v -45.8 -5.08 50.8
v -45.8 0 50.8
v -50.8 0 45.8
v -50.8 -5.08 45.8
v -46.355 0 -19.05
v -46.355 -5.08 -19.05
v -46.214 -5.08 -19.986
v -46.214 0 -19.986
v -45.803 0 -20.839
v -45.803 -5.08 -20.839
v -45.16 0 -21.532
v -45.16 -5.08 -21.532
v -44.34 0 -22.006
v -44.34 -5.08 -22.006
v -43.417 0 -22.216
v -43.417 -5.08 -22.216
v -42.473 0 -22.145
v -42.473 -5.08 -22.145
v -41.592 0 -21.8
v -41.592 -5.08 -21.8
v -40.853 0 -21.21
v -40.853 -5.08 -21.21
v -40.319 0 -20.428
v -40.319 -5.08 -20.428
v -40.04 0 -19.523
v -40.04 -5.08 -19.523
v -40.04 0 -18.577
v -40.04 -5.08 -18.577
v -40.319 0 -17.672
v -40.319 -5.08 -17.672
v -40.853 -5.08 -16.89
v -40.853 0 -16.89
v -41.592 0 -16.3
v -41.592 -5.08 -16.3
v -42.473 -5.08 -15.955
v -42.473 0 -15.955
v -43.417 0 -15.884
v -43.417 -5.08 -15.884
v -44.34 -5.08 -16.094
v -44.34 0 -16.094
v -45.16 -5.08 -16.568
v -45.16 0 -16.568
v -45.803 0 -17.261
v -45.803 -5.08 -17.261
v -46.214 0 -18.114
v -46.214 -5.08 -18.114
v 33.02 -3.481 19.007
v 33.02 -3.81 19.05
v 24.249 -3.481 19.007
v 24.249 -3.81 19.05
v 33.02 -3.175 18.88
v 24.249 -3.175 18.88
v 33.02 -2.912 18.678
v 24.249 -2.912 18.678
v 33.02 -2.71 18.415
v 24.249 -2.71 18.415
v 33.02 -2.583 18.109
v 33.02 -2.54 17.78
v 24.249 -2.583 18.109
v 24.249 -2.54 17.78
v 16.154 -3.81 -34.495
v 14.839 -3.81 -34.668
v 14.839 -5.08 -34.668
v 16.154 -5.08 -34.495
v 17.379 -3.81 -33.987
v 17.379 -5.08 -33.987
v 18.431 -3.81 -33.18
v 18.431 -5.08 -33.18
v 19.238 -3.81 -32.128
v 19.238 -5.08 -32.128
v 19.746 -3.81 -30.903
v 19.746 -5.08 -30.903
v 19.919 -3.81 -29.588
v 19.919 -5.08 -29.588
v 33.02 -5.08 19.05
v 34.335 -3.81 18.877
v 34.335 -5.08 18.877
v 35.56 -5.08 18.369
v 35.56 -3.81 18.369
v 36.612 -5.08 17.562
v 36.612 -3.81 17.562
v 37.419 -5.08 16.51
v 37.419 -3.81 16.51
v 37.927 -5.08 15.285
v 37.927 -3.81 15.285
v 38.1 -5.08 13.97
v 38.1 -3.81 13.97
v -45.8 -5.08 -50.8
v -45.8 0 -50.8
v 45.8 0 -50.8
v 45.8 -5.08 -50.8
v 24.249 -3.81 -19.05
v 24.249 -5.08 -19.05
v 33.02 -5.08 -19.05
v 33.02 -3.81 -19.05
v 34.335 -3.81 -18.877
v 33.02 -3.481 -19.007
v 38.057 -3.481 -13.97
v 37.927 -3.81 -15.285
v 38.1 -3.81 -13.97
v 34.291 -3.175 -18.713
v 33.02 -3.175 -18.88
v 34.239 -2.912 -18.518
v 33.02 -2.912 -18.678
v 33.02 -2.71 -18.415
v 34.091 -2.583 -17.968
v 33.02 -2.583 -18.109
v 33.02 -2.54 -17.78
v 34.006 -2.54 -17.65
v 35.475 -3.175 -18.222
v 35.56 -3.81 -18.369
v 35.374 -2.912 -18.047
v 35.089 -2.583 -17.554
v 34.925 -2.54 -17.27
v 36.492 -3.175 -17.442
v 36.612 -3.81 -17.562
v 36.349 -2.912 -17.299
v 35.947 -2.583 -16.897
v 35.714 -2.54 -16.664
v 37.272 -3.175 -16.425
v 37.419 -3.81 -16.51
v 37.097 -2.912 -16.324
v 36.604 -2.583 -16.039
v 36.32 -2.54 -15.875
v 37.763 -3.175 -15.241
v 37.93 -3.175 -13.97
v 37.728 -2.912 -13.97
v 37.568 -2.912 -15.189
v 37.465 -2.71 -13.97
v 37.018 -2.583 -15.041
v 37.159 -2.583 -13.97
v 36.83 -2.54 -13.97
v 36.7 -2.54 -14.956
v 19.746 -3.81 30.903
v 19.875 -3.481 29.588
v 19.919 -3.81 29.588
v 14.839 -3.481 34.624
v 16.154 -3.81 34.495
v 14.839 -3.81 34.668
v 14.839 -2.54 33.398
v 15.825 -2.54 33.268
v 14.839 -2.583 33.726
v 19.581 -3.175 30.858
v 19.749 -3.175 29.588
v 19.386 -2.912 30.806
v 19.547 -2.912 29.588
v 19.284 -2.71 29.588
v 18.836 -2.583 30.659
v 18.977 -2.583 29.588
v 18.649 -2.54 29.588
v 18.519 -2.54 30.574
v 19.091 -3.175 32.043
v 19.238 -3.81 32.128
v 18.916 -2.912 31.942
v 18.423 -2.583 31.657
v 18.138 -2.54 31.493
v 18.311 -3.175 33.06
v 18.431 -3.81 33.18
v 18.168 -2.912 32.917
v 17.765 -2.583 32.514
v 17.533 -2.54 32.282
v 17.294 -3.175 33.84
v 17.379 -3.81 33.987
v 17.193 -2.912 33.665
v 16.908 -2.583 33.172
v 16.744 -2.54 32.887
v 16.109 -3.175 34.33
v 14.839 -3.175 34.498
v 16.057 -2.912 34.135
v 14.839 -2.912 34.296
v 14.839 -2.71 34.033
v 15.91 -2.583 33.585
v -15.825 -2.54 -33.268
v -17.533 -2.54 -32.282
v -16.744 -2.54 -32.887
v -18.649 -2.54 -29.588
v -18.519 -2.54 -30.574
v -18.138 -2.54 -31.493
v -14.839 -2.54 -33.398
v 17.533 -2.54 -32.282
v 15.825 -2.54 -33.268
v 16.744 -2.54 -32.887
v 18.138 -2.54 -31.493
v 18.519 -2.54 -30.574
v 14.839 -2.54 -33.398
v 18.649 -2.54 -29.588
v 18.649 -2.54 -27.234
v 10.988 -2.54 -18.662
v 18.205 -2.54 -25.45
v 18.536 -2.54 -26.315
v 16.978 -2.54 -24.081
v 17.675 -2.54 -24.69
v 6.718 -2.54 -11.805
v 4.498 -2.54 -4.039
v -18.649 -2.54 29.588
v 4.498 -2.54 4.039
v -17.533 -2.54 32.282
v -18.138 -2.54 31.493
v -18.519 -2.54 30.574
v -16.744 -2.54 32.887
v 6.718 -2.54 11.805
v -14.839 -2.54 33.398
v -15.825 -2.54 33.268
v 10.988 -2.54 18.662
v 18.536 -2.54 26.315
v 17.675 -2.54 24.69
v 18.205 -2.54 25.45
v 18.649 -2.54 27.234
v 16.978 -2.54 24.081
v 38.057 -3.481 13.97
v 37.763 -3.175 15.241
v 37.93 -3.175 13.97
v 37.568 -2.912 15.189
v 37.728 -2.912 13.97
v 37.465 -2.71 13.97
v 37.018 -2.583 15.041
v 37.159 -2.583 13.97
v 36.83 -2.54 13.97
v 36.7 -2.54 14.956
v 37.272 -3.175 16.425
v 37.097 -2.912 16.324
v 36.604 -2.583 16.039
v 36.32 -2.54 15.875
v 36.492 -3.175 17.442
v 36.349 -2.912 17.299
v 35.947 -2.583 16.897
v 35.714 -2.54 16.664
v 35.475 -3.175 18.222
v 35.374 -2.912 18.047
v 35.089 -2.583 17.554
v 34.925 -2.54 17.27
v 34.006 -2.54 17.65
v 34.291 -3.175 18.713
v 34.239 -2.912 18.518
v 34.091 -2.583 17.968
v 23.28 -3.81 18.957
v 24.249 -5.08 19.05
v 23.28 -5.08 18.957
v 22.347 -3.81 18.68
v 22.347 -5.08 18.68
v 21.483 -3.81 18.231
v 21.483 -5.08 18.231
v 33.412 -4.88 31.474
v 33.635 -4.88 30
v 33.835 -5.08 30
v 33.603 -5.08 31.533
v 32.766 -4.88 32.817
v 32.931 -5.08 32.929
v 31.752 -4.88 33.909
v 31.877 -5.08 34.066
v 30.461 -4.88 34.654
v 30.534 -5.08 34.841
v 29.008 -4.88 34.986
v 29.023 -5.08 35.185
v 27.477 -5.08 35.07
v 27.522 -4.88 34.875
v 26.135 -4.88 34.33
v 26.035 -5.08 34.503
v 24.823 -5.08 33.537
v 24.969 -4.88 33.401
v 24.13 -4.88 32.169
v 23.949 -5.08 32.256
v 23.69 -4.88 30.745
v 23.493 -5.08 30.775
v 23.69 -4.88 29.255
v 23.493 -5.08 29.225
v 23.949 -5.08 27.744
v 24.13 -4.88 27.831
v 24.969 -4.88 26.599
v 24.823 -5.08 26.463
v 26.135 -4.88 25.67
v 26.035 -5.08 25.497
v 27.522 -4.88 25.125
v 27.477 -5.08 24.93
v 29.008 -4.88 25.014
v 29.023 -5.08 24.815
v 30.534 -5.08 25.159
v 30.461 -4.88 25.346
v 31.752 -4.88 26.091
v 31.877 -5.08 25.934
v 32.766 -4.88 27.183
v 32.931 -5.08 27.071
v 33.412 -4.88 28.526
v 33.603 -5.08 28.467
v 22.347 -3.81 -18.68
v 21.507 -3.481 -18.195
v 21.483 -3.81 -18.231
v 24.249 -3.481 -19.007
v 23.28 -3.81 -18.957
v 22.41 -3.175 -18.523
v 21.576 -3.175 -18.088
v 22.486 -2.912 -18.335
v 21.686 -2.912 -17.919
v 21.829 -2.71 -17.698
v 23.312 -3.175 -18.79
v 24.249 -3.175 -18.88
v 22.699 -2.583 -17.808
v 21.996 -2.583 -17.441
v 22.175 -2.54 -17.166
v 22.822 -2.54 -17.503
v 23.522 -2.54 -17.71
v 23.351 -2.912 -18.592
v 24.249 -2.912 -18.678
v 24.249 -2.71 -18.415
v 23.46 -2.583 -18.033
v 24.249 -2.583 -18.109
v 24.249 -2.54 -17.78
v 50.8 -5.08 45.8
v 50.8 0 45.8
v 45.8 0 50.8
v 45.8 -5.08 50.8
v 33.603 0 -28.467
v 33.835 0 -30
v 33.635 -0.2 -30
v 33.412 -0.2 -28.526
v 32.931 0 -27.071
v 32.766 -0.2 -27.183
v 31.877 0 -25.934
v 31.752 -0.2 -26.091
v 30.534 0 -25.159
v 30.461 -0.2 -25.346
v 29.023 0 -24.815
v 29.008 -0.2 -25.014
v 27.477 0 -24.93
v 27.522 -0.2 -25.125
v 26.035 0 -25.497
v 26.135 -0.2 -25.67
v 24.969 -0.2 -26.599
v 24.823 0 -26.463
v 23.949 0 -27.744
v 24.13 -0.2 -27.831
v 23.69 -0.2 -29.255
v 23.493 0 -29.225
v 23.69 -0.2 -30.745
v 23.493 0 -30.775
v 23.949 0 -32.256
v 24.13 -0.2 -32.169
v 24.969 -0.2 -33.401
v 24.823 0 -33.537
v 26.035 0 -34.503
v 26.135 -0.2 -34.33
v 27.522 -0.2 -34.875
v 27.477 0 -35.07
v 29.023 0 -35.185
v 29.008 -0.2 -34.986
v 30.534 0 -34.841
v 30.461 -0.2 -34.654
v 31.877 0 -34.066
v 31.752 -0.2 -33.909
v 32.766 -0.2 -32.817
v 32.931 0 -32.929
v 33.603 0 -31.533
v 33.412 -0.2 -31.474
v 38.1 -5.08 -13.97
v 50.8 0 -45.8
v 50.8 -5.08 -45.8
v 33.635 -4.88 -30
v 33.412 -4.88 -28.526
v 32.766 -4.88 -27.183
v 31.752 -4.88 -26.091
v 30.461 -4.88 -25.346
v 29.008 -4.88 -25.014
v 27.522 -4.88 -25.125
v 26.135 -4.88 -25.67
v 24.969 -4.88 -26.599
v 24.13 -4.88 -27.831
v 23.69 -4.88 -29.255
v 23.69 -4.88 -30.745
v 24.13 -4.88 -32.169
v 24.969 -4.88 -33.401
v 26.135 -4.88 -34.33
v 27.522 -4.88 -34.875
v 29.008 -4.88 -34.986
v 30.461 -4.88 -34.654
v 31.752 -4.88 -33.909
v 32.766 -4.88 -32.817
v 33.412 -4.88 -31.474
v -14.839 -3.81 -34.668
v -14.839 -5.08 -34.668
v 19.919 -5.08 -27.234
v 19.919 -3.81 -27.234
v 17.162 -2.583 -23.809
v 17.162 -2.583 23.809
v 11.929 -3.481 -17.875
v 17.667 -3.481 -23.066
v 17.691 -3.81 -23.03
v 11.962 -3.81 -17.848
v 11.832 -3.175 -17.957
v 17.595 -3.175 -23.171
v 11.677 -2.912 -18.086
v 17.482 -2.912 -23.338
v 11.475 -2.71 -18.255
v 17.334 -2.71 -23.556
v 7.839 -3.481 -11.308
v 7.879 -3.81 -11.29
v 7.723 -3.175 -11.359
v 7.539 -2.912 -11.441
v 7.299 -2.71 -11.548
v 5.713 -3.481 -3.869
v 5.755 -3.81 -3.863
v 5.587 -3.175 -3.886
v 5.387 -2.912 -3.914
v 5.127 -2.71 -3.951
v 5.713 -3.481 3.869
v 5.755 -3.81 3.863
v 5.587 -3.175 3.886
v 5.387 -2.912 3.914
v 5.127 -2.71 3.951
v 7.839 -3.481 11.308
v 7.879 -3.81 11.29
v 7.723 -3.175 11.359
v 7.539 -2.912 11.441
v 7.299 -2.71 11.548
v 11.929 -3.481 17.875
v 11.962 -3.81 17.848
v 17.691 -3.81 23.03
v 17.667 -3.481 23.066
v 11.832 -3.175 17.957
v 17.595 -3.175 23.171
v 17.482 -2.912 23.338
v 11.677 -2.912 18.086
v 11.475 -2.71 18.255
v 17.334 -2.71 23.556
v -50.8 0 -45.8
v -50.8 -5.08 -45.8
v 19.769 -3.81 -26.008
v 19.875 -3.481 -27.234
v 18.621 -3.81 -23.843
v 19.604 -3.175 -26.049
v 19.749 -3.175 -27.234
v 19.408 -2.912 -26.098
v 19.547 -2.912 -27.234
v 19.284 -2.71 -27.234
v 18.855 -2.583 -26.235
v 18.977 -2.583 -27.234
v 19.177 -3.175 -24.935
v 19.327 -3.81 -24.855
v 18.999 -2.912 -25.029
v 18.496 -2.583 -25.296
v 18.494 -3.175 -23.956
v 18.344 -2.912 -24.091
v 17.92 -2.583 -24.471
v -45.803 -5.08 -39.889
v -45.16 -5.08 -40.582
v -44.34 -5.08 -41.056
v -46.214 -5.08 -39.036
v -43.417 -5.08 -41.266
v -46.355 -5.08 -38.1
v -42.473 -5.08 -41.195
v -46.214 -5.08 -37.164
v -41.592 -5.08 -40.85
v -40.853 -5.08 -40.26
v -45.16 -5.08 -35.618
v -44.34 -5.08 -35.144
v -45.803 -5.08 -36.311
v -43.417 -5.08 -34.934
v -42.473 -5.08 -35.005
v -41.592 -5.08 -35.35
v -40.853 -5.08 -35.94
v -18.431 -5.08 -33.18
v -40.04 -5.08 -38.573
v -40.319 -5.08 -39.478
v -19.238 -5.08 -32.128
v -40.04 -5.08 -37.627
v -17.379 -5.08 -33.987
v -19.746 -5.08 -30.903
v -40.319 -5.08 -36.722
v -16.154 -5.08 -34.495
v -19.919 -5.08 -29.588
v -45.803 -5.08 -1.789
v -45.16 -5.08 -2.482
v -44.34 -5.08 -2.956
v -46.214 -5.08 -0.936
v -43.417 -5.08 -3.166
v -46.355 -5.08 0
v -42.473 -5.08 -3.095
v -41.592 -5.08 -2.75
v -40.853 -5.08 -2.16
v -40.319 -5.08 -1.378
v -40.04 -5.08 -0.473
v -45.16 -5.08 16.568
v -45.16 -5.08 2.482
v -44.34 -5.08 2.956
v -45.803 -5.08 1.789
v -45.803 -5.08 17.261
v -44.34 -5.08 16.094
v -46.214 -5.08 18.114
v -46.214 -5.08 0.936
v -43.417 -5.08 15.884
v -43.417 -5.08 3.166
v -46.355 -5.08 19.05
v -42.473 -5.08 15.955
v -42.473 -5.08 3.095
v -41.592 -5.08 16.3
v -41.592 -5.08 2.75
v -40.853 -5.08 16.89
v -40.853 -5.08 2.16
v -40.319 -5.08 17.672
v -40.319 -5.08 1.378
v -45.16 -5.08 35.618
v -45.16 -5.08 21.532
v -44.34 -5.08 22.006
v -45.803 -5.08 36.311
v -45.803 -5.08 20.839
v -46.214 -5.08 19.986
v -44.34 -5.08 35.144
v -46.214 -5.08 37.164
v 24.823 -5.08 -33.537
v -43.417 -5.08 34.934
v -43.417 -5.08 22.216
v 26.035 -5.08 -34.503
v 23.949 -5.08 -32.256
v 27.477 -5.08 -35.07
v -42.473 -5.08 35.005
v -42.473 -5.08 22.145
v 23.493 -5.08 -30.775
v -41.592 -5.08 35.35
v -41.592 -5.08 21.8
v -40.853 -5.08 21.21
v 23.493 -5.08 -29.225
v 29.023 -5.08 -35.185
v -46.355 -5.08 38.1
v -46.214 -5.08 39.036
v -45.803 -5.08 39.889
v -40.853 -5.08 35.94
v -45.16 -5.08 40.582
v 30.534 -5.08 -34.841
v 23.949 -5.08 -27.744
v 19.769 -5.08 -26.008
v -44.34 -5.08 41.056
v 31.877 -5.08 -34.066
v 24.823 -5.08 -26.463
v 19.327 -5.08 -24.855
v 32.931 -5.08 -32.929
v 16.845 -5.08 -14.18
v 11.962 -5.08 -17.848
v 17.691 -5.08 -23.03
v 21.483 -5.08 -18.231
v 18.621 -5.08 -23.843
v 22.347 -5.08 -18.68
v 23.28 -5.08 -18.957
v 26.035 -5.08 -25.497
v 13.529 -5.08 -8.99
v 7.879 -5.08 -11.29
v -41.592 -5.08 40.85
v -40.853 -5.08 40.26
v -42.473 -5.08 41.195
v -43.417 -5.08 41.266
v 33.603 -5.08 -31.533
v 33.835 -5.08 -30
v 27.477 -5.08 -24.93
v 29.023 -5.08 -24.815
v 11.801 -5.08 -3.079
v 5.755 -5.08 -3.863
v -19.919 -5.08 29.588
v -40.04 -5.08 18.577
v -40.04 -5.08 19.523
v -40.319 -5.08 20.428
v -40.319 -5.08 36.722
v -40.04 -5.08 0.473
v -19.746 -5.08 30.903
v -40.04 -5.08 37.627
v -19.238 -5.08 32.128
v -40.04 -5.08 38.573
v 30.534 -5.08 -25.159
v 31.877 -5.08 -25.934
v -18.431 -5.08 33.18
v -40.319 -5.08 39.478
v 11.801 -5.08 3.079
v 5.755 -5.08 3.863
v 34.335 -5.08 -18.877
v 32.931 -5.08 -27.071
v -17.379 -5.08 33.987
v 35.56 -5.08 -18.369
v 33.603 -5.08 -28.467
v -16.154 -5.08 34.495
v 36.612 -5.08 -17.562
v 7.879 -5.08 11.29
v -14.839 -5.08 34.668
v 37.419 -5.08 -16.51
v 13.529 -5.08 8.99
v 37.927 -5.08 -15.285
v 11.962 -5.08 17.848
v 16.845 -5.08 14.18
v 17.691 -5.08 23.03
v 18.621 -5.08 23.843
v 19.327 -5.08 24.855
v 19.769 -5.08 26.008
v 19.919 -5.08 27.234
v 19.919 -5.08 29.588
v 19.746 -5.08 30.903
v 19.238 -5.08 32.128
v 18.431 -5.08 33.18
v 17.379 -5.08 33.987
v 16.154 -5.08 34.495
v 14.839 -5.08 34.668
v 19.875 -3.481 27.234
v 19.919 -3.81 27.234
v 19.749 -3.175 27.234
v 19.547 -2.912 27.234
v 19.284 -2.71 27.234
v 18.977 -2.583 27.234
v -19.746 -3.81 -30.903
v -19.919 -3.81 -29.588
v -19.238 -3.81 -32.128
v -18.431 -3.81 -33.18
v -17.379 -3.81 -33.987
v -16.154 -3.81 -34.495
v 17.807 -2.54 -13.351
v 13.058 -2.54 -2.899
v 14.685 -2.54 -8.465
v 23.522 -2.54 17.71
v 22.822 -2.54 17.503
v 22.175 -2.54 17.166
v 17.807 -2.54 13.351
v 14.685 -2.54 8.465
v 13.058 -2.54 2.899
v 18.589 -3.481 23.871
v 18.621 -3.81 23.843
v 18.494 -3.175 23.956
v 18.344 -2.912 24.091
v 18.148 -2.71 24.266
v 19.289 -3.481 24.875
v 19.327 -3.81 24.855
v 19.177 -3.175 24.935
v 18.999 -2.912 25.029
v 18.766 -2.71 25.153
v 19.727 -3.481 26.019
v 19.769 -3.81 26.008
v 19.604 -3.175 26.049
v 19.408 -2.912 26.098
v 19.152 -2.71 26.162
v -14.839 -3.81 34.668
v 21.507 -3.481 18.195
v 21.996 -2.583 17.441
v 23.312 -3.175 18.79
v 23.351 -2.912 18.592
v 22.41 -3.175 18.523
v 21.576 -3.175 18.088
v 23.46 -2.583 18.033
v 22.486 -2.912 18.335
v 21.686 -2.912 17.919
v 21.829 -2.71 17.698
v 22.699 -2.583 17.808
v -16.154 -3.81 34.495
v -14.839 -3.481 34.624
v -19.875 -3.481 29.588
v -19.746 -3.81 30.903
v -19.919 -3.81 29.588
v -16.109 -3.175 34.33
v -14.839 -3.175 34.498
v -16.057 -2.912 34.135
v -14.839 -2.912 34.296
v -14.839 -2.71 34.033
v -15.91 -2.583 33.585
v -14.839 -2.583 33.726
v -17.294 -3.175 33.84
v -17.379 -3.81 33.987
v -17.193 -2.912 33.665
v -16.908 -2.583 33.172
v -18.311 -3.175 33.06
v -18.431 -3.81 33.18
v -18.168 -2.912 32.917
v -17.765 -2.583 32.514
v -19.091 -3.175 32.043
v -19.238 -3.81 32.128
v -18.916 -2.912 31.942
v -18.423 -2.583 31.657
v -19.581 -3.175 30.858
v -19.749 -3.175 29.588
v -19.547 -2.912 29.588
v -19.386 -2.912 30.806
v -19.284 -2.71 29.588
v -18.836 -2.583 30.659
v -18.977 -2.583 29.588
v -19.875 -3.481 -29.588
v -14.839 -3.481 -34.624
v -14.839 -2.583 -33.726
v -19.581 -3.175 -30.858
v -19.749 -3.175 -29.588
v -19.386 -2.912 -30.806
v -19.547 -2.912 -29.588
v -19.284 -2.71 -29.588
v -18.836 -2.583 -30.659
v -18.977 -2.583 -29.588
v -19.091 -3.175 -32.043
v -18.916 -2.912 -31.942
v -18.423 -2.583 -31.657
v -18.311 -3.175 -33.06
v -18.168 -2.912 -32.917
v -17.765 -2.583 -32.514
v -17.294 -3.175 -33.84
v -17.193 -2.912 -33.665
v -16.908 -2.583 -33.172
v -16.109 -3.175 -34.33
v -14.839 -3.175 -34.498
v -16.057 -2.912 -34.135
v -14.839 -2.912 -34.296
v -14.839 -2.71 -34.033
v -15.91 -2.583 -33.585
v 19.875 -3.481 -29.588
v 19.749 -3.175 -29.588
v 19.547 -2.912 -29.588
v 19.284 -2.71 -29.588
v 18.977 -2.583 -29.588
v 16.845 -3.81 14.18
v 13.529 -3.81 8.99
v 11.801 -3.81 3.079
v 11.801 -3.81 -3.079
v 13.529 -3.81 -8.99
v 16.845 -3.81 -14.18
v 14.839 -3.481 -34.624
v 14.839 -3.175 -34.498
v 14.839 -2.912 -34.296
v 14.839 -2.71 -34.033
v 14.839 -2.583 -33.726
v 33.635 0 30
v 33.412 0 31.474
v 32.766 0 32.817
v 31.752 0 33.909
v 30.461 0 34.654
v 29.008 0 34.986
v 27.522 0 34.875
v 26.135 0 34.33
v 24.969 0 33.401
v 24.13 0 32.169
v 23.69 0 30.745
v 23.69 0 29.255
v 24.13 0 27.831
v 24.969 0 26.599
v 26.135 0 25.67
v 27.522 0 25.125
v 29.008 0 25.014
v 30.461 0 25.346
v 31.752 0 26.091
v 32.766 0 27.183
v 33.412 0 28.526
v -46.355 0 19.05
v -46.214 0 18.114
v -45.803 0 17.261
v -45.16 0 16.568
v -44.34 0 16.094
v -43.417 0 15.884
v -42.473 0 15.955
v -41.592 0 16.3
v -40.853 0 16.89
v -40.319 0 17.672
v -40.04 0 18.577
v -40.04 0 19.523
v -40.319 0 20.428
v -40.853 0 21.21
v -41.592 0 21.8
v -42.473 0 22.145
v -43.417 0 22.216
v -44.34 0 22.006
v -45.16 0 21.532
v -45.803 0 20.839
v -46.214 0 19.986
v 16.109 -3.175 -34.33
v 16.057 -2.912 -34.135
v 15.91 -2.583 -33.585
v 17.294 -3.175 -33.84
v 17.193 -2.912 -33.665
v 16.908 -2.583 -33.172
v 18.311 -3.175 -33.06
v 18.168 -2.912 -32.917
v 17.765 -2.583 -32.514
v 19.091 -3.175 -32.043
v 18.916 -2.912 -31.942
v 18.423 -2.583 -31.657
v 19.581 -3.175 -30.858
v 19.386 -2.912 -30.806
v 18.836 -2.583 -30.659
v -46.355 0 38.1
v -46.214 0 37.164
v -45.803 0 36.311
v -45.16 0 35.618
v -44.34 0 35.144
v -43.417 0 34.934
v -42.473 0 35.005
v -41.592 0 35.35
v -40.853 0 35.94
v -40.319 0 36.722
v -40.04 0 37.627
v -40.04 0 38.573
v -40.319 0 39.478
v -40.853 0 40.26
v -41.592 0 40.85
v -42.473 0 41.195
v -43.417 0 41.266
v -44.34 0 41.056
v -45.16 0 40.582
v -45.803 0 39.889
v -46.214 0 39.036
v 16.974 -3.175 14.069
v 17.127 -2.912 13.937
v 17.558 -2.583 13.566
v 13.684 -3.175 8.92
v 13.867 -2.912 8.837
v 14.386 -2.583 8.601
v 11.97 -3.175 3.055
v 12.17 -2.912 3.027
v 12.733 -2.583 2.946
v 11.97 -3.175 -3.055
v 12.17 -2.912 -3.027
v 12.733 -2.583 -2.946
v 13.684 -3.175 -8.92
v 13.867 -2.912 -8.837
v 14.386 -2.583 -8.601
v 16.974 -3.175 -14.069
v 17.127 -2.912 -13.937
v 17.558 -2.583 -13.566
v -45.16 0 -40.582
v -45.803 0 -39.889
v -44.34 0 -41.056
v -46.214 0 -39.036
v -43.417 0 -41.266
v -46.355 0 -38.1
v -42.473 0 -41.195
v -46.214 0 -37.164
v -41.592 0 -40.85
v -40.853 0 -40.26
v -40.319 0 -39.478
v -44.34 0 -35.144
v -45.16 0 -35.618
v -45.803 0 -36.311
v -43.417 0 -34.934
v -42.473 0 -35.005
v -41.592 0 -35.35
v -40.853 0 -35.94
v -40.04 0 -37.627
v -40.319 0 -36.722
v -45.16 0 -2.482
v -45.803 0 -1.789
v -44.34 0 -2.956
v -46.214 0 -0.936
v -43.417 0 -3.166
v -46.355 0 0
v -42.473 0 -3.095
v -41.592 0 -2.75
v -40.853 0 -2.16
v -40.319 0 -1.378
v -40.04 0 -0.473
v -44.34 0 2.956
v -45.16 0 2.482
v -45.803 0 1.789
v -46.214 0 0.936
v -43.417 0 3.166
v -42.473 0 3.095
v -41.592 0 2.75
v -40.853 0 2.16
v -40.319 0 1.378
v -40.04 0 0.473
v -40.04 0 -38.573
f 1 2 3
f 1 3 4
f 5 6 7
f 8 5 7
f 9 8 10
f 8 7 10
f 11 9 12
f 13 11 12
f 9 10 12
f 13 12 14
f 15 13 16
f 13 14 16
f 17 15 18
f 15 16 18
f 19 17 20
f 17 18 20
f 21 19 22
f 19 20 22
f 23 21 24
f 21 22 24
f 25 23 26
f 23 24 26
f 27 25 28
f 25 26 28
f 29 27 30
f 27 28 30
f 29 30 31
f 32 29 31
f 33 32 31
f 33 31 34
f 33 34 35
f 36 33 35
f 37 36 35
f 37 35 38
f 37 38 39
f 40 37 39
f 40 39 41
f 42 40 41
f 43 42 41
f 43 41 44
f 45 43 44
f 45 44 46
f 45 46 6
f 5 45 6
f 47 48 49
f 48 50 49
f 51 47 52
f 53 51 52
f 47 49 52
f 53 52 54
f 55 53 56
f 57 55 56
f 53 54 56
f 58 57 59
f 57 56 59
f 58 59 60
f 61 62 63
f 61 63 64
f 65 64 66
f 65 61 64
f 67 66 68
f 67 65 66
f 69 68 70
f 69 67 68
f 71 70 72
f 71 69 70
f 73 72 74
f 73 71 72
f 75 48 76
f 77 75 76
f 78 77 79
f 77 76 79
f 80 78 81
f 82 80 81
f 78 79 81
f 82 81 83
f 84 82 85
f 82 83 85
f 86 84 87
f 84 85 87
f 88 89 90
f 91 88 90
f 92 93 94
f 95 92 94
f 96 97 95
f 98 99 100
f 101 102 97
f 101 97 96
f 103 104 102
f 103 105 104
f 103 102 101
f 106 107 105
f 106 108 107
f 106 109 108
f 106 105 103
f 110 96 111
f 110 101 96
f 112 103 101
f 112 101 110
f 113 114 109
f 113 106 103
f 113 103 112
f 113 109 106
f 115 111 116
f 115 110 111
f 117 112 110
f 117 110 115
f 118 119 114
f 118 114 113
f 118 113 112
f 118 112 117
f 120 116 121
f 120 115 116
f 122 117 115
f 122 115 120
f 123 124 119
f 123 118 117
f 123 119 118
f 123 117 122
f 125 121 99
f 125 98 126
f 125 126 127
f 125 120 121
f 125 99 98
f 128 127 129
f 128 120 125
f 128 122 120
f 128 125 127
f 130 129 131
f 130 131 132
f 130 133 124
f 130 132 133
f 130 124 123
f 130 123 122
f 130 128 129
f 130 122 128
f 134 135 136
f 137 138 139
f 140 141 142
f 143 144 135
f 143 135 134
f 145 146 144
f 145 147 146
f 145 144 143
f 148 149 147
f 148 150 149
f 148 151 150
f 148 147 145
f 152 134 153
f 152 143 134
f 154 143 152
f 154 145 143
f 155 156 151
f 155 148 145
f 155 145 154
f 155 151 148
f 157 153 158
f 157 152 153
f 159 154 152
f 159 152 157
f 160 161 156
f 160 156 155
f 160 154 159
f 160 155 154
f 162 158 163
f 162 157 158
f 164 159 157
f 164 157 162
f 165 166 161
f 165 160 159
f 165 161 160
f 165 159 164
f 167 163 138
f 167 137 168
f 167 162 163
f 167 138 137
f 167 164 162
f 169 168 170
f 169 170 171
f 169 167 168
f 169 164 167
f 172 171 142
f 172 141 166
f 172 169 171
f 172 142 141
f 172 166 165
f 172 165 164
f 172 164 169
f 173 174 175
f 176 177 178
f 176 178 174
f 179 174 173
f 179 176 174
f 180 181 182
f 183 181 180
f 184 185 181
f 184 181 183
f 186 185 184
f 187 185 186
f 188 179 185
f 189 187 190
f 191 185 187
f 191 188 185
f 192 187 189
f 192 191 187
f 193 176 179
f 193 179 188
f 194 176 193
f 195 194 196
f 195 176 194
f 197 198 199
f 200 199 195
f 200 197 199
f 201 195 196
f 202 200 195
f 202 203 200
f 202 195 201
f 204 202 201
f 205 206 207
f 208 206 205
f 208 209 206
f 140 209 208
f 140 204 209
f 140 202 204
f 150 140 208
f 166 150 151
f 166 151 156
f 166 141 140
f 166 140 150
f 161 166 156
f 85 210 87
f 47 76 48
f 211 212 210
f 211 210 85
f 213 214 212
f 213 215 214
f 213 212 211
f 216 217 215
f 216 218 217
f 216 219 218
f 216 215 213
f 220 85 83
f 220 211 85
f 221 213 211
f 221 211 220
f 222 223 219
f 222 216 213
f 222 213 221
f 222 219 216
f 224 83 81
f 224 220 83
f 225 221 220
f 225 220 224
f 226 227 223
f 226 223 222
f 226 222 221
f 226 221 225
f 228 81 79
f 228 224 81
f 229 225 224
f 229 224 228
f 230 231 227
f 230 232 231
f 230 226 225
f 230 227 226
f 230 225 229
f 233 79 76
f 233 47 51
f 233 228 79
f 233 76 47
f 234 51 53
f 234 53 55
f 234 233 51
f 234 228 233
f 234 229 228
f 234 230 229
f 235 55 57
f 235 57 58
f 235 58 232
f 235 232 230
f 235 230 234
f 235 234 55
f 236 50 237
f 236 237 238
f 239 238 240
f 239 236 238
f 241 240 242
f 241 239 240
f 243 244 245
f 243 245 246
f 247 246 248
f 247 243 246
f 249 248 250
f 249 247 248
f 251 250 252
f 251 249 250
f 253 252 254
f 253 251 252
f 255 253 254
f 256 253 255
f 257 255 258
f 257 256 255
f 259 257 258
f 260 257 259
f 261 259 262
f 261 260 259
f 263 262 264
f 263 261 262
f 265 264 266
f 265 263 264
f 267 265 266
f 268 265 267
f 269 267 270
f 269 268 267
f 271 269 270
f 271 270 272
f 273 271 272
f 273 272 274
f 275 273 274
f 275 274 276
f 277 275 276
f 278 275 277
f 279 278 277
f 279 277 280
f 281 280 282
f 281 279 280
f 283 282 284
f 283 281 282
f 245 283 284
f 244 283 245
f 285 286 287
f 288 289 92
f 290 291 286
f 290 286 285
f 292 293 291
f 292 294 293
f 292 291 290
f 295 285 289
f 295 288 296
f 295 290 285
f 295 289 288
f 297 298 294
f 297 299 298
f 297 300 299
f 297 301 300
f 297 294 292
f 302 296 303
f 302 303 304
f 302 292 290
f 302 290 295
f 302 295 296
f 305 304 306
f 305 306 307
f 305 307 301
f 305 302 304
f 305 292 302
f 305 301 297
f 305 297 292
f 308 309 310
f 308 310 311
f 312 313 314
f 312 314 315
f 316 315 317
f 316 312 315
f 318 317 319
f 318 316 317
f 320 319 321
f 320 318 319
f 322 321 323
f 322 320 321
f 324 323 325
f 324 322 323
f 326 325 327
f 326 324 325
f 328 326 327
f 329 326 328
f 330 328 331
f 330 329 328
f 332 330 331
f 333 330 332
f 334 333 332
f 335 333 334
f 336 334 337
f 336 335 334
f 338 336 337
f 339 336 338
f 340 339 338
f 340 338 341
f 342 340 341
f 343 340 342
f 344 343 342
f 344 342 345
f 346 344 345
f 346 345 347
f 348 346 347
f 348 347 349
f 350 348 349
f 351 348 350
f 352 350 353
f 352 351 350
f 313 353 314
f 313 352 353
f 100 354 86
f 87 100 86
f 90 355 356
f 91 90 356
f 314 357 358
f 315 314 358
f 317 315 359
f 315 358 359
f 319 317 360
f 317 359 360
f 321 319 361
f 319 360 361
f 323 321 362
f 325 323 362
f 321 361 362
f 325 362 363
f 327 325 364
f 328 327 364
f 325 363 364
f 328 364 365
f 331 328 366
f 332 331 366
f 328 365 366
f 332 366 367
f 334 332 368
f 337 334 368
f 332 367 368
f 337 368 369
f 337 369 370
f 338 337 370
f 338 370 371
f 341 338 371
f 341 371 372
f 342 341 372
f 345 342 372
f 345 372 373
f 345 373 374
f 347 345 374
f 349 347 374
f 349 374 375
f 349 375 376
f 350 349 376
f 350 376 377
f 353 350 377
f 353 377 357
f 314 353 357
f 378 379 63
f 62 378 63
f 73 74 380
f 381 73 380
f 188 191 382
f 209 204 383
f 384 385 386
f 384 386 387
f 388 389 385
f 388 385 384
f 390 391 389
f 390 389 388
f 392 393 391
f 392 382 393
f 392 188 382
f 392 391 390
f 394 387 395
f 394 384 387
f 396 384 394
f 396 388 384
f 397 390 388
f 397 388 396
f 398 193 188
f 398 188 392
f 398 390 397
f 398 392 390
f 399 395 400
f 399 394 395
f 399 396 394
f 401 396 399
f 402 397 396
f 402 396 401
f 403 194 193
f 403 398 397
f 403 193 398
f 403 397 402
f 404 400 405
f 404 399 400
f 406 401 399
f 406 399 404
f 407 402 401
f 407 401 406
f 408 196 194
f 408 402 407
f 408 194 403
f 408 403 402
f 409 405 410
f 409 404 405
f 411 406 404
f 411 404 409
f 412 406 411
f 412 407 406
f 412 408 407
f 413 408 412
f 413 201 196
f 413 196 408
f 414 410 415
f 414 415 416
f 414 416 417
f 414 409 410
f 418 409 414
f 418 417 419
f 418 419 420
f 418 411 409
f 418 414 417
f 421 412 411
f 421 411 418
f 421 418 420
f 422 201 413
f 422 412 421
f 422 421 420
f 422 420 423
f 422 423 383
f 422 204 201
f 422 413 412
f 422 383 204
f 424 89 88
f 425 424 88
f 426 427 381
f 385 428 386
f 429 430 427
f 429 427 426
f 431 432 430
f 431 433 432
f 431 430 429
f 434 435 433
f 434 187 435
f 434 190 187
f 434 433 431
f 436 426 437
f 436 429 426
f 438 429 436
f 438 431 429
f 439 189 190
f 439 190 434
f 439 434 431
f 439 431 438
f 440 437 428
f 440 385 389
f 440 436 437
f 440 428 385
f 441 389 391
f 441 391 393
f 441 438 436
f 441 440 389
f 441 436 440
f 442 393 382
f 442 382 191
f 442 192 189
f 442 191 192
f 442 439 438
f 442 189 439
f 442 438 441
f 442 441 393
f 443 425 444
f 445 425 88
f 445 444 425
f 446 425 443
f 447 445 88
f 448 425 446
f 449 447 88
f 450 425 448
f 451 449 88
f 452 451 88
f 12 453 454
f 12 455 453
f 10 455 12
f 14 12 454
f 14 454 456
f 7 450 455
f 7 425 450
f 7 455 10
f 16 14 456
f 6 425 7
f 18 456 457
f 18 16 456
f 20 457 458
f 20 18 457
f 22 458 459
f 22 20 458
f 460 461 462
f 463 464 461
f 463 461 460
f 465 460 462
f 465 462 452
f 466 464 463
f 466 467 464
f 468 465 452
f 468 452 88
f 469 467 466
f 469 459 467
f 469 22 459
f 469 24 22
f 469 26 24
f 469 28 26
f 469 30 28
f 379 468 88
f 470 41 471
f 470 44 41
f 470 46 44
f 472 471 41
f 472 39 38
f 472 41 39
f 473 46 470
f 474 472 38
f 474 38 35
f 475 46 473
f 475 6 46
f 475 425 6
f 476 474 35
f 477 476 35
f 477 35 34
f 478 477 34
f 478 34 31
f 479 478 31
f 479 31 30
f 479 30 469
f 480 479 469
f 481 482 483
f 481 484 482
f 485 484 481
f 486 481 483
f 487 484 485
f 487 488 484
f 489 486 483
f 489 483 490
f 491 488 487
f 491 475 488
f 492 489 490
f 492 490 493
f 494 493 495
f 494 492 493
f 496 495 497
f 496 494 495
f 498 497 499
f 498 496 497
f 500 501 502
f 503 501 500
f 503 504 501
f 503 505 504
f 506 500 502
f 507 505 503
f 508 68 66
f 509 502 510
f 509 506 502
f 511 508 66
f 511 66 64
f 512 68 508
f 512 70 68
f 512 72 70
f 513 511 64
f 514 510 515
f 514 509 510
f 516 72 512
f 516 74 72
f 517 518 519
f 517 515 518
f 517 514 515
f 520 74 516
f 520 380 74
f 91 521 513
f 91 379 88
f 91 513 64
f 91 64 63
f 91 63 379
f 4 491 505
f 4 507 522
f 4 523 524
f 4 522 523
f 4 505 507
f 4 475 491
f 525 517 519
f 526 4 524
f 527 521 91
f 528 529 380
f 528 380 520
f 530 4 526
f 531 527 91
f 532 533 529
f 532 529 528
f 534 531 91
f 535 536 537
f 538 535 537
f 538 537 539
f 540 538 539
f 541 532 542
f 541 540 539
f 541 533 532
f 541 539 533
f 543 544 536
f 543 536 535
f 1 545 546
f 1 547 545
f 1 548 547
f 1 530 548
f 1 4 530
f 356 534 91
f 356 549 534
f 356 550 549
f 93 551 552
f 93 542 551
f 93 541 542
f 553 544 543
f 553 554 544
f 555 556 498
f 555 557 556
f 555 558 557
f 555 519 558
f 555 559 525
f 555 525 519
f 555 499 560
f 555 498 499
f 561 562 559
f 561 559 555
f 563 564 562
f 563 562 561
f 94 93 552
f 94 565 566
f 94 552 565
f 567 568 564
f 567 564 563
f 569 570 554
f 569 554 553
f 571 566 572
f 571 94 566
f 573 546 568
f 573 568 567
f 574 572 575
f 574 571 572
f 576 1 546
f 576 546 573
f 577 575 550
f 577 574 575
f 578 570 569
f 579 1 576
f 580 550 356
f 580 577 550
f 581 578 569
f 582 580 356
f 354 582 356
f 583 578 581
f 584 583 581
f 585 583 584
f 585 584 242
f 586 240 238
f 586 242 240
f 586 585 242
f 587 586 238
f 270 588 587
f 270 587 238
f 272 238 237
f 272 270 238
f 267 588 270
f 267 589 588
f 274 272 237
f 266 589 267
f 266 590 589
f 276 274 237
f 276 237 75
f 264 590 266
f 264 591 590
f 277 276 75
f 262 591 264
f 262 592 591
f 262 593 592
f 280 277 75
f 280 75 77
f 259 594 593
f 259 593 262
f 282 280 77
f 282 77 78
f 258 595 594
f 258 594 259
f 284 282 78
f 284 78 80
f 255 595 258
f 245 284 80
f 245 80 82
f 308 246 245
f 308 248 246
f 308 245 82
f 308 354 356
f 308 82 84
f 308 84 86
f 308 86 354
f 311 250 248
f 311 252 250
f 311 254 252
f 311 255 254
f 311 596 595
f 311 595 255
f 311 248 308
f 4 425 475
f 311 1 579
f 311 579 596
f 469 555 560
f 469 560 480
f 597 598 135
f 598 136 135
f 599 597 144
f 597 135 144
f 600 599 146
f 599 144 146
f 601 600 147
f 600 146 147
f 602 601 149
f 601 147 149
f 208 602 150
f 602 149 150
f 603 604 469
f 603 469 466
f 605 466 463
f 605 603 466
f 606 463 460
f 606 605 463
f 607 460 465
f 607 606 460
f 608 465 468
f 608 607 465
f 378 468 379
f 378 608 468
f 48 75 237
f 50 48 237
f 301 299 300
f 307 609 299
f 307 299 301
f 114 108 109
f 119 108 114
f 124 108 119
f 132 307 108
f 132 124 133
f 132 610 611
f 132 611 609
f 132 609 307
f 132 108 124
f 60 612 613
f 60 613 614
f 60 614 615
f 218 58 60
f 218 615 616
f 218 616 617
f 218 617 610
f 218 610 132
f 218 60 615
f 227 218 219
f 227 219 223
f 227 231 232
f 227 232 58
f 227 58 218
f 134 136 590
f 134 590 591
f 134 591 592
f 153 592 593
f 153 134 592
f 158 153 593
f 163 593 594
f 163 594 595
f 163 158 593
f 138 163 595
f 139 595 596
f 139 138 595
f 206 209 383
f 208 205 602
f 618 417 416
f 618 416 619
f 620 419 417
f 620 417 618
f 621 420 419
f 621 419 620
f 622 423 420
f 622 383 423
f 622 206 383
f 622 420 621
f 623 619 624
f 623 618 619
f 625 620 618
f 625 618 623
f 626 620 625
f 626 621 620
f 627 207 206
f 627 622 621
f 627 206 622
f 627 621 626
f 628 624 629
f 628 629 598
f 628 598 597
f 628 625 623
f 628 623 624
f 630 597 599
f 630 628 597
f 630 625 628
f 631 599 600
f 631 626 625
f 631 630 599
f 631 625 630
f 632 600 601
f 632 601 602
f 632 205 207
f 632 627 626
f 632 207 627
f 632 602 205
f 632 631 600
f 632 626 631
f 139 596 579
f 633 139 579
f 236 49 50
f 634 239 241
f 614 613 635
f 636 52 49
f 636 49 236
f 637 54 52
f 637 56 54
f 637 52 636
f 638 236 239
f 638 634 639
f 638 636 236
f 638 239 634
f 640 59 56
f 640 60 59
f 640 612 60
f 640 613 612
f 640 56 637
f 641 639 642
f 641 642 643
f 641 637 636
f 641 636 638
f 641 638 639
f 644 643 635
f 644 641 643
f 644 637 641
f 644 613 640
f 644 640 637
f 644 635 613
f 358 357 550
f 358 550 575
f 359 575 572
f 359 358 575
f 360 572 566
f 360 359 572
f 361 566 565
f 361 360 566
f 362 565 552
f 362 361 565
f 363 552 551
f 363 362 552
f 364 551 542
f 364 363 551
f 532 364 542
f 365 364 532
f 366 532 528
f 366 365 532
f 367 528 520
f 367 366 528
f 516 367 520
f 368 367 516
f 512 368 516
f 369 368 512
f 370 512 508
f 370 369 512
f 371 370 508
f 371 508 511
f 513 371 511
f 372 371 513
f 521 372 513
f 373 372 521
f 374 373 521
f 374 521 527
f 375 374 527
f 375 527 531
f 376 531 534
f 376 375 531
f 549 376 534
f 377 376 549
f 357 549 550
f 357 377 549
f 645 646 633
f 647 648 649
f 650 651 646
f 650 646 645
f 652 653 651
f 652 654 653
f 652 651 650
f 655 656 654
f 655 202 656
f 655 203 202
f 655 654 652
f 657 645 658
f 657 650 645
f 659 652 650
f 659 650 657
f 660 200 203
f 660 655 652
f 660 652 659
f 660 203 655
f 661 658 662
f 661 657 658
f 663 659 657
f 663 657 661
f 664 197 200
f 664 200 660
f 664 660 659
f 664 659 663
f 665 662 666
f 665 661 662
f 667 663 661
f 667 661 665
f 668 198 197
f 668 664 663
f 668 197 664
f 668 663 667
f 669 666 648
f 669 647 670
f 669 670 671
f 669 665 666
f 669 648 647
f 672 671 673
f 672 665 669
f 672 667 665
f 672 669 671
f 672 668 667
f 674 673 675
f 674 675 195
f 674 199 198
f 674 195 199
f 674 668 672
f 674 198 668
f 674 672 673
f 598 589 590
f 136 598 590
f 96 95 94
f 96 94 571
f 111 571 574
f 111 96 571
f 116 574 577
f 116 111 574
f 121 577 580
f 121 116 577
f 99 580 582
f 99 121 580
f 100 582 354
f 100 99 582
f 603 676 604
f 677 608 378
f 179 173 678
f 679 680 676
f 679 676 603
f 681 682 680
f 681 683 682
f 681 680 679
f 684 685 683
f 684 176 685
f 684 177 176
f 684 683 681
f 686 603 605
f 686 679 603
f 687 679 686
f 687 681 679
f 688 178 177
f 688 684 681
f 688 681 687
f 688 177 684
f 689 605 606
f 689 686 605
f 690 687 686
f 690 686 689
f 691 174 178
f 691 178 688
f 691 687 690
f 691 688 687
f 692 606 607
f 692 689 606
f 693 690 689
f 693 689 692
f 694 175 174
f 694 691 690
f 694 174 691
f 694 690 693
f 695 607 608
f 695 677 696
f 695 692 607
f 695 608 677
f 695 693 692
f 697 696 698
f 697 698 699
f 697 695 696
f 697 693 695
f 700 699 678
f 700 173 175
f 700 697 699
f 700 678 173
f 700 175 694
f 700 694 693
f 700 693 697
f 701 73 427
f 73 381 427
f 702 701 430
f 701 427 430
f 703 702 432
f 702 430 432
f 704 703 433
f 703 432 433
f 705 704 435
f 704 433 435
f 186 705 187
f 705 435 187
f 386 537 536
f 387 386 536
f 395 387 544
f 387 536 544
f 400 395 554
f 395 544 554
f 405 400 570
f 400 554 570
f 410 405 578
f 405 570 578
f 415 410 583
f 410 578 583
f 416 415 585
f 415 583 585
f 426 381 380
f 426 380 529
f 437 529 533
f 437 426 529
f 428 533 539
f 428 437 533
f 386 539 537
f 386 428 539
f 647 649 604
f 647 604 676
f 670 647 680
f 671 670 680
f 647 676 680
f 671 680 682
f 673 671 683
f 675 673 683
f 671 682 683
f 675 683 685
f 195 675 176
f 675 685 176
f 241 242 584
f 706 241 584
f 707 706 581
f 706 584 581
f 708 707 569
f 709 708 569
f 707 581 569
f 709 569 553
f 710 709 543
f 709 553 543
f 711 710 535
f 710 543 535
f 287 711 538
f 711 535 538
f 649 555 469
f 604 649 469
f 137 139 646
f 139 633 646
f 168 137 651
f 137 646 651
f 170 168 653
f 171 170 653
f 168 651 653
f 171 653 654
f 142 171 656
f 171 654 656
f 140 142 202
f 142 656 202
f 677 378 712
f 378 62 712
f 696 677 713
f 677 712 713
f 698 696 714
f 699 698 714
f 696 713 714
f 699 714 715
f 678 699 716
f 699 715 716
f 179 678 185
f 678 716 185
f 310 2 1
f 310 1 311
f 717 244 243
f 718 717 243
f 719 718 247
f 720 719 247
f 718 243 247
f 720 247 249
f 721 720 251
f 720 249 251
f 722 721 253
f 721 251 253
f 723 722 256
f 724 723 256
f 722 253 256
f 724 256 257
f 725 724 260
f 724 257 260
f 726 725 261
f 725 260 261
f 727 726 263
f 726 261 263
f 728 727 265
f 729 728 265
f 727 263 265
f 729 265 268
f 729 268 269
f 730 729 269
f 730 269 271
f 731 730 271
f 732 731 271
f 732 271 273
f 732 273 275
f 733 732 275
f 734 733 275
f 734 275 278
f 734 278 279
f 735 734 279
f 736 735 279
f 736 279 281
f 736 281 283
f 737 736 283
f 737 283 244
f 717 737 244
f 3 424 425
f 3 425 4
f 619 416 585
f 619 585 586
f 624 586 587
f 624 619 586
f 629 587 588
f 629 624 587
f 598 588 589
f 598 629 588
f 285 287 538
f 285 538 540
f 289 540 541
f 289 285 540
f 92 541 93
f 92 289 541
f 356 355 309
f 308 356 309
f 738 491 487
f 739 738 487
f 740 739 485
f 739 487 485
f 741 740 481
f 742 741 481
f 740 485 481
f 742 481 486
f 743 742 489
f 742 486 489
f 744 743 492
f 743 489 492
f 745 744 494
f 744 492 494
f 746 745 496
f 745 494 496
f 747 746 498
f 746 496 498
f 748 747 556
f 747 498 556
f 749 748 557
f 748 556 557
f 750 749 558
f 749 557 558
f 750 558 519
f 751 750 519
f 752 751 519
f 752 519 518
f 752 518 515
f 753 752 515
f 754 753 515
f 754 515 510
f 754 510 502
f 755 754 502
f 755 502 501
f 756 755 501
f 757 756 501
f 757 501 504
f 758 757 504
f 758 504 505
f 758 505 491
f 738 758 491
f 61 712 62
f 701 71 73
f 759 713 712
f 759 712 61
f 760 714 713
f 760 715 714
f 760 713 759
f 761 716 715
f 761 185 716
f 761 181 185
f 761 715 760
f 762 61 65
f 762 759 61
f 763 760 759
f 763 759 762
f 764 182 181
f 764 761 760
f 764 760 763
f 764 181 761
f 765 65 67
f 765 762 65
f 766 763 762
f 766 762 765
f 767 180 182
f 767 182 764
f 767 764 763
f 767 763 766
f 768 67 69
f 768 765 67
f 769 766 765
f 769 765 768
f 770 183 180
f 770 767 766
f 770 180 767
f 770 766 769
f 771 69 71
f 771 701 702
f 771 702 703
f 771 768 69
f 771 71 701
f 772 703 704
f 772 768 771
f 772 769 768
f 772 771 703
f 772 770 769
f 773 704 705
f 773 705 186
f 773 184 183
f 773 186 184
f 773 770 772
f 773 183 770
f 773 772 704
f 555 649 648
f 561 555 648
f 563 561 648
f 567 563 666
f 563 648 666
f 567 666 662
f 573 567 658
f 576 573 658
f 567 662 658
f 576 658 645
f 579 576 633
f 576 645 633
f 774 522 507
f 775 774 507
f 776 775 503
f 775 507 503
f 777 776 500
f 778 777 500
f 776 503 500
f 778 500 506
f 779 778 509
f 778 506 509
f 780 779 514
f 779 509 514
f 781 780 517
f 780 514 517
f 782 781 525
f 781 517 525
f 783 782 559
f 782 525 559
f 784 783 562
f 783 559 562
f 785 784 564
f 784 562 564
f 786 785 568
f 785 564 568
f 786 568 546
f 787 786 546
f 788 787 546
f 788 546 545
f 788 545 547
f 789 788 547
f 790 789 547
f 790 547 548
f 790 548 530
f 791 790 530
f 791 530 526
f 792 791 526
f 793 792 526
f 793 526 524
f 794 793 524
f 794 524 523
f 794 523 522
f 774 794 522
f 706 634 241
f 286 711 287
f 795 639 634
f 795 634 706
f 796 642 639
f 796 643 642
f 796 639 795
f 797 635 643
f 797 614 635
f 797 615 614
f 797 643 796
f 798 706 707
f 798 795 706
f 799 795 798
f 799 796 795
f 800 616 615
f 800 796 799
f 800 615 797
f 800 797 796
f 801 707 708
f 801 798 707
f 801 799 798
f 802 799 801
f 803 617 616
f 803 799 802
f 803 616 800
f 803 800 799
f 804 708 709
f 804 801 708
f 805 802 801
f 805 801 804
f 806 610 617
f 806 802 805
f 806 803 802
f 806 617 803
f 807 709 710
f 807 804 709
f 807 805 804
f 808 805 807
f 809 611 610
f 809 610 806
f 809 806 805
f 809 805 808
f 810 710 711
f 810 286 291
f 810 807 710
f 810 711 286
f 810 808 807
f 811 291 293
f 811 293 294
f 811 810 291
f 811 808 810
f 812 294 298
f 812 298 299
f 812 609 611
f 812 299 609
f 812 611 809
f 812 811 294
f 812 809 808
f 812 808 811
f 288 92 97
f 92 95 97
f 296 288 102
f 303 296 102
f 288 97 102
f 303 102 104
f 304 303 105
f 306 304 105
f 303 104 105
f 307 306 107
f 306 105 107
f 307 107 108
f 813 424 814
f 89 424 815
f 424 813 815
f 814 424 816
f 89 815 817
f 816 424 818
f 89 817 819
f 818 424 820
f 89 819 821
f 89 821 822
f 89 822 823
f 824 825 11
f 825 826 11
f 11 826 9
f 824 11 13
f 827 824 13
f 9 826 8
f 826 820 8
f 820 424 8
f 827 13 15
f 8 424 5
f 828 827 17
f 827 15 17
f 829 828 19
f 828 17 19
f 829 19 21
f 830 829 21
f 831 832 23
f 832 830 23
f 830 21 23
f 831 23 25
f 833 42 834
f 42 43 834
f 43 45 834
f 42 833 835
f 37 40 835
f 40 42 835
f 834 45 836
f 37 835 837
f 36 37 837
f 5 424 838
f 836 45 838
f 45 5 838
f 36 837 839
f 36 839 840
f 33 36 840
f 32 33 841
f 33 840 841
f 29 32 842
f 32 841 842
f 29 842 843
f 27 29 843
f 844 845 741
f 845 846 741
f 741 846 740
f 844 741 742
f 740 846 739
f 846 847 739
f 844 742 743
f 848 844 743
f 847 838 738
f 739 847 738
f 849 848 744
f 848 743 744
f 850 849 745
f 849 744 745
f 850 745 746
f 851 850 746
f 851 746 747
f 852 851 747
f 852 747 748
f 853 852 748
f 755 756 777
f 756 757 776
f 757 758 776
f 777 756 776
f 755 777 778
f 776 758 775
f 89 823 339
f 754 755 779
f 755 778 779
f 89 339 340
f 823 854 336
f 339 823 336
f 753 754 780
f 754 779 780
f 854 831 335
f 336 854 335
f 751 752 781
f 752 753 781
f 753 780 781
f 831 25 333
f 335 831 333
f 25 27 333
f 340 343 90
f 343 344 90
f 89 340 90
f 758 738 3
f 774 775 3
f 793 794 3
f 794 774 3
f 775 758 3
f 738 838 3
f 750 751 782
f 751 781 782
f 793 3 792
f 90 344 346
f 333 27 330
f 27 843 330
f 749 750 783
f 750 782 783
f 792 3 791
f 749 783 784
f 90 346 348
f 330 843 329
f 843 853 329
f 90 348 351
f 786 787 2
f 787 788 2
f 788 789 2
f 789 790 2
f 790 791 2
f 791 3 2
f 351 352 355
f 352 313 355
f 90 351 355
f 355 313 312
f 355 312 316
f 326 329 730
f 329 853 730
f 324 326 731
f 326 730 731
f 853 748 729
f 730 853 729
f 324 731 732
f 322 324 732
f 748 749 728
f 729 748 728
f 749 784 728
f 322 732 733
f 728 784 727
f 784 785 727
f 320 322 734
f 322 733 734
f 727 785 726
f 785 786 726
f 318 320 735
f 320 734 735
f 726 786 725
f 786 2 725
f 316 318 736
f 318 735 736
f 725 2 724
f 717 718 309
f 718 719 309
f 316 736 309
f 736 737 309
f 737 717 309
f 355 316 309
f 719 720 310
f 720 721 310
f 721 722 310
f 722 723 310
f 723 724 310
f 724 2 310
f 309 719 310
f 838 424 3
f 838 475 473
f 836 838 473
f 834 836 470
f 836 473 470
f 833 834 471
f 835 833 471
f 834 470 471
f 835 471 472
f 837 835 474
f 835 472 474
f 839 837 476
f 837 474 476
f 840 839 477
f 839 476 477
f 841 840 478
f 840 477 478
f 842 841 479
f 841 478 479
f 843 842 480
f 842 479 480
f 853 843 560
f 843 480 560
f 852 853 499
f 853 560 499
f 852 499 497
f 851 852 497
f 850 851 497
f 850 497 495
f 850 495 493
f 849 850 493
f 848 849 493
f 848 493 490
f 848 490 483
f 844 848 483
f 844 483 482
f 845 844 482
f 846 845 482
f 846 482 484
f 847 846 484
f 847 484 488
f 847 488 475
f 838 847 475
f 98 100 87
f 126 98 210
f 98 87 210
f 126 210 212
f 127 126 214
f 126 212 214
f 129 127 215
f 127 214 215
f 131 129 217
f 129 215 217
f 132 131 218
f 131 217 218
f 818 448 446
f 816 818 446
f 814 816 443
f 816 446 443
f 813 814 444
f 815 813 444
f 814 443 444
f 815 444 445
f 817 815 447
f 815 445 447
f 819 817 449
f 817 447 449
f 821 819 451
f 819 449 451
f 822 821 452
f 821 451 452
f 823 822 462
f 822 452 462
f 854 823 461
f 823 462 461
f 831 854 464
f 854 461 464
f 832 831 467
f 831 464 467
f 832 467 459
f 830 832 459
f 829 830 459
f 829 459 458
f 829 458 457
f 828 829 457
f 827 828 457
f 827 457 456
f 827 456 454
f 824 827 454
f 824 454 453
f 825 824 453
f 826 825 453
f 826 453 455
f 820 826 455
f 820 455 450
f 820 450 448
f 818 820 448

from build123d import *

# Parameters (mm, degrees)
F0_W      = 101.6
F0_H      = 101.6
F1_DEPTH  = 5.08
F3_D      = 6.35
F5_DEPTH  = 2.54
F6_R      = 5.08
F7_R      = 1.27
F9_DEPTH  = 2.54
F10_R     = 5.08
F11_R     = 1.27
F12_R     = 5
F13_DEPTH = 25
F14_SIZE  = 0.2
F15_SIZE  = 5


with BuildPart() as f1:
    # F0 (on Front) → F1 (new body)
    with BuildSketch(Plane.XZ):
        Rectangle(F0_W, F0_H)
    extrude(amount=F1_DEPTH)

    # F3 (through all)
    with Locations(Plane(origin=(0, 0, 0), x_dir=(1, 0, 0), z_dir=(0, 1, 0))):
        with Locations((-43.18, 38.1), (-43.18, 19.05), (-43.18, 0), (-43.18, -19.05), (-43.18, -38.1)):
            Hole(F3_D / 2)

    # F4 (on face) → F5 (cut)
    with BuildSketch(Plane.XZ.offset(5.08)):
        with BuildLine():
            Line((-19.9187304825, 34.667711705), (-19.9187304825, -34.667711705))
            Line((-19.9187304825, -34.667711705), (19.9187304825, -34.667711705))
            Line((19.9187304825, -34.667711705), (19.9187304825, -24.3936947418))
            ThreePointArc((19.9187304825, -24.3936947418), (5.4860749886, 0), (19.9187304825, 24.3936947418))
            Line((19.9187304825, 24.3936947418), (19.9187304825, 34.667711705))
            Line((19.9187304825, 34.667711705), (-19.9187304825, 34.667711705))
        make_face()
    extrude(amount=-F5_DEPTH, mode=Mode.SUBTRACT)

    # F6
    f6_edges = [f1.edges().sort_by_distance(p)[0] for p in [
        (-19.91873, -3.81, 34.667712),
        (19.91873, -3.81, 34.667712),
        (19.91873, -3.81, 24.393695),
        (19.91873, -3.81, -24.393695),
        (19.91873, -3.81, -34.667712),
        (-19.91873, -3.81, -34.667712),
    ]]
    fillet(f6_edges, radius=F6_R)

    # F7
    f7_edges = [f1.edges().sort_by_distance(p)[0] for p in [
        (19.91873, -2.54, 28.410832),
        (19.327372, -2.54, 24.855192),
        (18.430833, -2.54, 33.179814),
        (5.486075, -2.54, 0),
        (0, -2.54, 34.667712),
        (19.327372, -2.54, -24.855192),
        (-18.430833, -2.54, 33.179814),
        (19.91873, -2.54, -28.410832),
        (-19.91873, -2.54, 0),
        (18.430833, -2.54, -33.179814),
        (-18.430833, -2.54, -33.179814),
        (0, -2.54, -34.667712),
    ]]
    fillet(f7_edges, radius=F7_R)

    # F8 (on face) → F9 (cut)
    with BuildSketch(Plane.XZ.offset(5.08)):
        with BuildLine():
            Line((38.1, 19.05), (22.8523529701, 19.05))
            ThreePointArc((22.8523529701, 19.05), (11.5820746869, 0), (22.8523529701, -19.05))
            Line((22.8523529701, -19.05), (38.1, -19.05))
            Line((38.1, -19.05), (38.1, 19.05))
        make_face()
    extrude(amount=-F9_DEPTH, mode=Mode.SUBTRACT)

    # F10
    f10_edges = [f1.edges().sort_by_distance(p)[0] for p in [
        (22.852353, -3.81, 19.05),
        (38.1, -3.81, 19.05),
        (38.1, -3.81, -19.05),
        (22.852353, -3.81, -19.05),
    ]]
    fillet(f10_edges, radius=F10_R)

    # F11
    f11_edges = [f1.edges().sort_by_distance(p)[0] for p in [
        (28.634501, -2.54, -19.05),
        (22.8067, -2.54, -18.840951),
        (36.612102, -2.54, -17.562102),
        (11.582075, -2.54, 0),
        (38.1, -2.54, 0),
        (22.8067, -2.54, 18.840951),
        (36.612102, -2.54, 17.562102),
        (28.634501, -2.54, 19.05),
    ]]
    fillet(f11_edges, radius=F11_R)

    # F12 (on face) → F13 (cut)
    with BuildSketch(Plane.XZ.offset(5.08)):
        with Locations((28.6345014435, 30)):
            Circle(F12_R)
        with Locations((28.6345014435, -30)):
            Circle(F12_R)
    extrude(amount=-F13_DEPTH, mode=Mode.SUBTRACT)

    # F14
    f14_edges = [f1.edges().sort_by_distance(p)[0] for p in [
        (23.634501, -5.08, 30),
        (23.634501, -5.08, -30),
        (33.634501, -2.54, -30),
        (23.634501, 0, -30),
    ]]
    chamfer(f14_edges, length=F14_SIZE)

    # F15
    f15_edges = [f1.edges().sort_by_distance(p)[0] for p in [
        (50.8, -2.54, -50.8),
        (50.8, -2.54, 50.8),
        (-50.8, -2.54, -50.8),
        (-50.8, -2.54, 50.8),
    ]]
    chamfer(f15_edges, length=F15_SIZE)


solid = f1.part
